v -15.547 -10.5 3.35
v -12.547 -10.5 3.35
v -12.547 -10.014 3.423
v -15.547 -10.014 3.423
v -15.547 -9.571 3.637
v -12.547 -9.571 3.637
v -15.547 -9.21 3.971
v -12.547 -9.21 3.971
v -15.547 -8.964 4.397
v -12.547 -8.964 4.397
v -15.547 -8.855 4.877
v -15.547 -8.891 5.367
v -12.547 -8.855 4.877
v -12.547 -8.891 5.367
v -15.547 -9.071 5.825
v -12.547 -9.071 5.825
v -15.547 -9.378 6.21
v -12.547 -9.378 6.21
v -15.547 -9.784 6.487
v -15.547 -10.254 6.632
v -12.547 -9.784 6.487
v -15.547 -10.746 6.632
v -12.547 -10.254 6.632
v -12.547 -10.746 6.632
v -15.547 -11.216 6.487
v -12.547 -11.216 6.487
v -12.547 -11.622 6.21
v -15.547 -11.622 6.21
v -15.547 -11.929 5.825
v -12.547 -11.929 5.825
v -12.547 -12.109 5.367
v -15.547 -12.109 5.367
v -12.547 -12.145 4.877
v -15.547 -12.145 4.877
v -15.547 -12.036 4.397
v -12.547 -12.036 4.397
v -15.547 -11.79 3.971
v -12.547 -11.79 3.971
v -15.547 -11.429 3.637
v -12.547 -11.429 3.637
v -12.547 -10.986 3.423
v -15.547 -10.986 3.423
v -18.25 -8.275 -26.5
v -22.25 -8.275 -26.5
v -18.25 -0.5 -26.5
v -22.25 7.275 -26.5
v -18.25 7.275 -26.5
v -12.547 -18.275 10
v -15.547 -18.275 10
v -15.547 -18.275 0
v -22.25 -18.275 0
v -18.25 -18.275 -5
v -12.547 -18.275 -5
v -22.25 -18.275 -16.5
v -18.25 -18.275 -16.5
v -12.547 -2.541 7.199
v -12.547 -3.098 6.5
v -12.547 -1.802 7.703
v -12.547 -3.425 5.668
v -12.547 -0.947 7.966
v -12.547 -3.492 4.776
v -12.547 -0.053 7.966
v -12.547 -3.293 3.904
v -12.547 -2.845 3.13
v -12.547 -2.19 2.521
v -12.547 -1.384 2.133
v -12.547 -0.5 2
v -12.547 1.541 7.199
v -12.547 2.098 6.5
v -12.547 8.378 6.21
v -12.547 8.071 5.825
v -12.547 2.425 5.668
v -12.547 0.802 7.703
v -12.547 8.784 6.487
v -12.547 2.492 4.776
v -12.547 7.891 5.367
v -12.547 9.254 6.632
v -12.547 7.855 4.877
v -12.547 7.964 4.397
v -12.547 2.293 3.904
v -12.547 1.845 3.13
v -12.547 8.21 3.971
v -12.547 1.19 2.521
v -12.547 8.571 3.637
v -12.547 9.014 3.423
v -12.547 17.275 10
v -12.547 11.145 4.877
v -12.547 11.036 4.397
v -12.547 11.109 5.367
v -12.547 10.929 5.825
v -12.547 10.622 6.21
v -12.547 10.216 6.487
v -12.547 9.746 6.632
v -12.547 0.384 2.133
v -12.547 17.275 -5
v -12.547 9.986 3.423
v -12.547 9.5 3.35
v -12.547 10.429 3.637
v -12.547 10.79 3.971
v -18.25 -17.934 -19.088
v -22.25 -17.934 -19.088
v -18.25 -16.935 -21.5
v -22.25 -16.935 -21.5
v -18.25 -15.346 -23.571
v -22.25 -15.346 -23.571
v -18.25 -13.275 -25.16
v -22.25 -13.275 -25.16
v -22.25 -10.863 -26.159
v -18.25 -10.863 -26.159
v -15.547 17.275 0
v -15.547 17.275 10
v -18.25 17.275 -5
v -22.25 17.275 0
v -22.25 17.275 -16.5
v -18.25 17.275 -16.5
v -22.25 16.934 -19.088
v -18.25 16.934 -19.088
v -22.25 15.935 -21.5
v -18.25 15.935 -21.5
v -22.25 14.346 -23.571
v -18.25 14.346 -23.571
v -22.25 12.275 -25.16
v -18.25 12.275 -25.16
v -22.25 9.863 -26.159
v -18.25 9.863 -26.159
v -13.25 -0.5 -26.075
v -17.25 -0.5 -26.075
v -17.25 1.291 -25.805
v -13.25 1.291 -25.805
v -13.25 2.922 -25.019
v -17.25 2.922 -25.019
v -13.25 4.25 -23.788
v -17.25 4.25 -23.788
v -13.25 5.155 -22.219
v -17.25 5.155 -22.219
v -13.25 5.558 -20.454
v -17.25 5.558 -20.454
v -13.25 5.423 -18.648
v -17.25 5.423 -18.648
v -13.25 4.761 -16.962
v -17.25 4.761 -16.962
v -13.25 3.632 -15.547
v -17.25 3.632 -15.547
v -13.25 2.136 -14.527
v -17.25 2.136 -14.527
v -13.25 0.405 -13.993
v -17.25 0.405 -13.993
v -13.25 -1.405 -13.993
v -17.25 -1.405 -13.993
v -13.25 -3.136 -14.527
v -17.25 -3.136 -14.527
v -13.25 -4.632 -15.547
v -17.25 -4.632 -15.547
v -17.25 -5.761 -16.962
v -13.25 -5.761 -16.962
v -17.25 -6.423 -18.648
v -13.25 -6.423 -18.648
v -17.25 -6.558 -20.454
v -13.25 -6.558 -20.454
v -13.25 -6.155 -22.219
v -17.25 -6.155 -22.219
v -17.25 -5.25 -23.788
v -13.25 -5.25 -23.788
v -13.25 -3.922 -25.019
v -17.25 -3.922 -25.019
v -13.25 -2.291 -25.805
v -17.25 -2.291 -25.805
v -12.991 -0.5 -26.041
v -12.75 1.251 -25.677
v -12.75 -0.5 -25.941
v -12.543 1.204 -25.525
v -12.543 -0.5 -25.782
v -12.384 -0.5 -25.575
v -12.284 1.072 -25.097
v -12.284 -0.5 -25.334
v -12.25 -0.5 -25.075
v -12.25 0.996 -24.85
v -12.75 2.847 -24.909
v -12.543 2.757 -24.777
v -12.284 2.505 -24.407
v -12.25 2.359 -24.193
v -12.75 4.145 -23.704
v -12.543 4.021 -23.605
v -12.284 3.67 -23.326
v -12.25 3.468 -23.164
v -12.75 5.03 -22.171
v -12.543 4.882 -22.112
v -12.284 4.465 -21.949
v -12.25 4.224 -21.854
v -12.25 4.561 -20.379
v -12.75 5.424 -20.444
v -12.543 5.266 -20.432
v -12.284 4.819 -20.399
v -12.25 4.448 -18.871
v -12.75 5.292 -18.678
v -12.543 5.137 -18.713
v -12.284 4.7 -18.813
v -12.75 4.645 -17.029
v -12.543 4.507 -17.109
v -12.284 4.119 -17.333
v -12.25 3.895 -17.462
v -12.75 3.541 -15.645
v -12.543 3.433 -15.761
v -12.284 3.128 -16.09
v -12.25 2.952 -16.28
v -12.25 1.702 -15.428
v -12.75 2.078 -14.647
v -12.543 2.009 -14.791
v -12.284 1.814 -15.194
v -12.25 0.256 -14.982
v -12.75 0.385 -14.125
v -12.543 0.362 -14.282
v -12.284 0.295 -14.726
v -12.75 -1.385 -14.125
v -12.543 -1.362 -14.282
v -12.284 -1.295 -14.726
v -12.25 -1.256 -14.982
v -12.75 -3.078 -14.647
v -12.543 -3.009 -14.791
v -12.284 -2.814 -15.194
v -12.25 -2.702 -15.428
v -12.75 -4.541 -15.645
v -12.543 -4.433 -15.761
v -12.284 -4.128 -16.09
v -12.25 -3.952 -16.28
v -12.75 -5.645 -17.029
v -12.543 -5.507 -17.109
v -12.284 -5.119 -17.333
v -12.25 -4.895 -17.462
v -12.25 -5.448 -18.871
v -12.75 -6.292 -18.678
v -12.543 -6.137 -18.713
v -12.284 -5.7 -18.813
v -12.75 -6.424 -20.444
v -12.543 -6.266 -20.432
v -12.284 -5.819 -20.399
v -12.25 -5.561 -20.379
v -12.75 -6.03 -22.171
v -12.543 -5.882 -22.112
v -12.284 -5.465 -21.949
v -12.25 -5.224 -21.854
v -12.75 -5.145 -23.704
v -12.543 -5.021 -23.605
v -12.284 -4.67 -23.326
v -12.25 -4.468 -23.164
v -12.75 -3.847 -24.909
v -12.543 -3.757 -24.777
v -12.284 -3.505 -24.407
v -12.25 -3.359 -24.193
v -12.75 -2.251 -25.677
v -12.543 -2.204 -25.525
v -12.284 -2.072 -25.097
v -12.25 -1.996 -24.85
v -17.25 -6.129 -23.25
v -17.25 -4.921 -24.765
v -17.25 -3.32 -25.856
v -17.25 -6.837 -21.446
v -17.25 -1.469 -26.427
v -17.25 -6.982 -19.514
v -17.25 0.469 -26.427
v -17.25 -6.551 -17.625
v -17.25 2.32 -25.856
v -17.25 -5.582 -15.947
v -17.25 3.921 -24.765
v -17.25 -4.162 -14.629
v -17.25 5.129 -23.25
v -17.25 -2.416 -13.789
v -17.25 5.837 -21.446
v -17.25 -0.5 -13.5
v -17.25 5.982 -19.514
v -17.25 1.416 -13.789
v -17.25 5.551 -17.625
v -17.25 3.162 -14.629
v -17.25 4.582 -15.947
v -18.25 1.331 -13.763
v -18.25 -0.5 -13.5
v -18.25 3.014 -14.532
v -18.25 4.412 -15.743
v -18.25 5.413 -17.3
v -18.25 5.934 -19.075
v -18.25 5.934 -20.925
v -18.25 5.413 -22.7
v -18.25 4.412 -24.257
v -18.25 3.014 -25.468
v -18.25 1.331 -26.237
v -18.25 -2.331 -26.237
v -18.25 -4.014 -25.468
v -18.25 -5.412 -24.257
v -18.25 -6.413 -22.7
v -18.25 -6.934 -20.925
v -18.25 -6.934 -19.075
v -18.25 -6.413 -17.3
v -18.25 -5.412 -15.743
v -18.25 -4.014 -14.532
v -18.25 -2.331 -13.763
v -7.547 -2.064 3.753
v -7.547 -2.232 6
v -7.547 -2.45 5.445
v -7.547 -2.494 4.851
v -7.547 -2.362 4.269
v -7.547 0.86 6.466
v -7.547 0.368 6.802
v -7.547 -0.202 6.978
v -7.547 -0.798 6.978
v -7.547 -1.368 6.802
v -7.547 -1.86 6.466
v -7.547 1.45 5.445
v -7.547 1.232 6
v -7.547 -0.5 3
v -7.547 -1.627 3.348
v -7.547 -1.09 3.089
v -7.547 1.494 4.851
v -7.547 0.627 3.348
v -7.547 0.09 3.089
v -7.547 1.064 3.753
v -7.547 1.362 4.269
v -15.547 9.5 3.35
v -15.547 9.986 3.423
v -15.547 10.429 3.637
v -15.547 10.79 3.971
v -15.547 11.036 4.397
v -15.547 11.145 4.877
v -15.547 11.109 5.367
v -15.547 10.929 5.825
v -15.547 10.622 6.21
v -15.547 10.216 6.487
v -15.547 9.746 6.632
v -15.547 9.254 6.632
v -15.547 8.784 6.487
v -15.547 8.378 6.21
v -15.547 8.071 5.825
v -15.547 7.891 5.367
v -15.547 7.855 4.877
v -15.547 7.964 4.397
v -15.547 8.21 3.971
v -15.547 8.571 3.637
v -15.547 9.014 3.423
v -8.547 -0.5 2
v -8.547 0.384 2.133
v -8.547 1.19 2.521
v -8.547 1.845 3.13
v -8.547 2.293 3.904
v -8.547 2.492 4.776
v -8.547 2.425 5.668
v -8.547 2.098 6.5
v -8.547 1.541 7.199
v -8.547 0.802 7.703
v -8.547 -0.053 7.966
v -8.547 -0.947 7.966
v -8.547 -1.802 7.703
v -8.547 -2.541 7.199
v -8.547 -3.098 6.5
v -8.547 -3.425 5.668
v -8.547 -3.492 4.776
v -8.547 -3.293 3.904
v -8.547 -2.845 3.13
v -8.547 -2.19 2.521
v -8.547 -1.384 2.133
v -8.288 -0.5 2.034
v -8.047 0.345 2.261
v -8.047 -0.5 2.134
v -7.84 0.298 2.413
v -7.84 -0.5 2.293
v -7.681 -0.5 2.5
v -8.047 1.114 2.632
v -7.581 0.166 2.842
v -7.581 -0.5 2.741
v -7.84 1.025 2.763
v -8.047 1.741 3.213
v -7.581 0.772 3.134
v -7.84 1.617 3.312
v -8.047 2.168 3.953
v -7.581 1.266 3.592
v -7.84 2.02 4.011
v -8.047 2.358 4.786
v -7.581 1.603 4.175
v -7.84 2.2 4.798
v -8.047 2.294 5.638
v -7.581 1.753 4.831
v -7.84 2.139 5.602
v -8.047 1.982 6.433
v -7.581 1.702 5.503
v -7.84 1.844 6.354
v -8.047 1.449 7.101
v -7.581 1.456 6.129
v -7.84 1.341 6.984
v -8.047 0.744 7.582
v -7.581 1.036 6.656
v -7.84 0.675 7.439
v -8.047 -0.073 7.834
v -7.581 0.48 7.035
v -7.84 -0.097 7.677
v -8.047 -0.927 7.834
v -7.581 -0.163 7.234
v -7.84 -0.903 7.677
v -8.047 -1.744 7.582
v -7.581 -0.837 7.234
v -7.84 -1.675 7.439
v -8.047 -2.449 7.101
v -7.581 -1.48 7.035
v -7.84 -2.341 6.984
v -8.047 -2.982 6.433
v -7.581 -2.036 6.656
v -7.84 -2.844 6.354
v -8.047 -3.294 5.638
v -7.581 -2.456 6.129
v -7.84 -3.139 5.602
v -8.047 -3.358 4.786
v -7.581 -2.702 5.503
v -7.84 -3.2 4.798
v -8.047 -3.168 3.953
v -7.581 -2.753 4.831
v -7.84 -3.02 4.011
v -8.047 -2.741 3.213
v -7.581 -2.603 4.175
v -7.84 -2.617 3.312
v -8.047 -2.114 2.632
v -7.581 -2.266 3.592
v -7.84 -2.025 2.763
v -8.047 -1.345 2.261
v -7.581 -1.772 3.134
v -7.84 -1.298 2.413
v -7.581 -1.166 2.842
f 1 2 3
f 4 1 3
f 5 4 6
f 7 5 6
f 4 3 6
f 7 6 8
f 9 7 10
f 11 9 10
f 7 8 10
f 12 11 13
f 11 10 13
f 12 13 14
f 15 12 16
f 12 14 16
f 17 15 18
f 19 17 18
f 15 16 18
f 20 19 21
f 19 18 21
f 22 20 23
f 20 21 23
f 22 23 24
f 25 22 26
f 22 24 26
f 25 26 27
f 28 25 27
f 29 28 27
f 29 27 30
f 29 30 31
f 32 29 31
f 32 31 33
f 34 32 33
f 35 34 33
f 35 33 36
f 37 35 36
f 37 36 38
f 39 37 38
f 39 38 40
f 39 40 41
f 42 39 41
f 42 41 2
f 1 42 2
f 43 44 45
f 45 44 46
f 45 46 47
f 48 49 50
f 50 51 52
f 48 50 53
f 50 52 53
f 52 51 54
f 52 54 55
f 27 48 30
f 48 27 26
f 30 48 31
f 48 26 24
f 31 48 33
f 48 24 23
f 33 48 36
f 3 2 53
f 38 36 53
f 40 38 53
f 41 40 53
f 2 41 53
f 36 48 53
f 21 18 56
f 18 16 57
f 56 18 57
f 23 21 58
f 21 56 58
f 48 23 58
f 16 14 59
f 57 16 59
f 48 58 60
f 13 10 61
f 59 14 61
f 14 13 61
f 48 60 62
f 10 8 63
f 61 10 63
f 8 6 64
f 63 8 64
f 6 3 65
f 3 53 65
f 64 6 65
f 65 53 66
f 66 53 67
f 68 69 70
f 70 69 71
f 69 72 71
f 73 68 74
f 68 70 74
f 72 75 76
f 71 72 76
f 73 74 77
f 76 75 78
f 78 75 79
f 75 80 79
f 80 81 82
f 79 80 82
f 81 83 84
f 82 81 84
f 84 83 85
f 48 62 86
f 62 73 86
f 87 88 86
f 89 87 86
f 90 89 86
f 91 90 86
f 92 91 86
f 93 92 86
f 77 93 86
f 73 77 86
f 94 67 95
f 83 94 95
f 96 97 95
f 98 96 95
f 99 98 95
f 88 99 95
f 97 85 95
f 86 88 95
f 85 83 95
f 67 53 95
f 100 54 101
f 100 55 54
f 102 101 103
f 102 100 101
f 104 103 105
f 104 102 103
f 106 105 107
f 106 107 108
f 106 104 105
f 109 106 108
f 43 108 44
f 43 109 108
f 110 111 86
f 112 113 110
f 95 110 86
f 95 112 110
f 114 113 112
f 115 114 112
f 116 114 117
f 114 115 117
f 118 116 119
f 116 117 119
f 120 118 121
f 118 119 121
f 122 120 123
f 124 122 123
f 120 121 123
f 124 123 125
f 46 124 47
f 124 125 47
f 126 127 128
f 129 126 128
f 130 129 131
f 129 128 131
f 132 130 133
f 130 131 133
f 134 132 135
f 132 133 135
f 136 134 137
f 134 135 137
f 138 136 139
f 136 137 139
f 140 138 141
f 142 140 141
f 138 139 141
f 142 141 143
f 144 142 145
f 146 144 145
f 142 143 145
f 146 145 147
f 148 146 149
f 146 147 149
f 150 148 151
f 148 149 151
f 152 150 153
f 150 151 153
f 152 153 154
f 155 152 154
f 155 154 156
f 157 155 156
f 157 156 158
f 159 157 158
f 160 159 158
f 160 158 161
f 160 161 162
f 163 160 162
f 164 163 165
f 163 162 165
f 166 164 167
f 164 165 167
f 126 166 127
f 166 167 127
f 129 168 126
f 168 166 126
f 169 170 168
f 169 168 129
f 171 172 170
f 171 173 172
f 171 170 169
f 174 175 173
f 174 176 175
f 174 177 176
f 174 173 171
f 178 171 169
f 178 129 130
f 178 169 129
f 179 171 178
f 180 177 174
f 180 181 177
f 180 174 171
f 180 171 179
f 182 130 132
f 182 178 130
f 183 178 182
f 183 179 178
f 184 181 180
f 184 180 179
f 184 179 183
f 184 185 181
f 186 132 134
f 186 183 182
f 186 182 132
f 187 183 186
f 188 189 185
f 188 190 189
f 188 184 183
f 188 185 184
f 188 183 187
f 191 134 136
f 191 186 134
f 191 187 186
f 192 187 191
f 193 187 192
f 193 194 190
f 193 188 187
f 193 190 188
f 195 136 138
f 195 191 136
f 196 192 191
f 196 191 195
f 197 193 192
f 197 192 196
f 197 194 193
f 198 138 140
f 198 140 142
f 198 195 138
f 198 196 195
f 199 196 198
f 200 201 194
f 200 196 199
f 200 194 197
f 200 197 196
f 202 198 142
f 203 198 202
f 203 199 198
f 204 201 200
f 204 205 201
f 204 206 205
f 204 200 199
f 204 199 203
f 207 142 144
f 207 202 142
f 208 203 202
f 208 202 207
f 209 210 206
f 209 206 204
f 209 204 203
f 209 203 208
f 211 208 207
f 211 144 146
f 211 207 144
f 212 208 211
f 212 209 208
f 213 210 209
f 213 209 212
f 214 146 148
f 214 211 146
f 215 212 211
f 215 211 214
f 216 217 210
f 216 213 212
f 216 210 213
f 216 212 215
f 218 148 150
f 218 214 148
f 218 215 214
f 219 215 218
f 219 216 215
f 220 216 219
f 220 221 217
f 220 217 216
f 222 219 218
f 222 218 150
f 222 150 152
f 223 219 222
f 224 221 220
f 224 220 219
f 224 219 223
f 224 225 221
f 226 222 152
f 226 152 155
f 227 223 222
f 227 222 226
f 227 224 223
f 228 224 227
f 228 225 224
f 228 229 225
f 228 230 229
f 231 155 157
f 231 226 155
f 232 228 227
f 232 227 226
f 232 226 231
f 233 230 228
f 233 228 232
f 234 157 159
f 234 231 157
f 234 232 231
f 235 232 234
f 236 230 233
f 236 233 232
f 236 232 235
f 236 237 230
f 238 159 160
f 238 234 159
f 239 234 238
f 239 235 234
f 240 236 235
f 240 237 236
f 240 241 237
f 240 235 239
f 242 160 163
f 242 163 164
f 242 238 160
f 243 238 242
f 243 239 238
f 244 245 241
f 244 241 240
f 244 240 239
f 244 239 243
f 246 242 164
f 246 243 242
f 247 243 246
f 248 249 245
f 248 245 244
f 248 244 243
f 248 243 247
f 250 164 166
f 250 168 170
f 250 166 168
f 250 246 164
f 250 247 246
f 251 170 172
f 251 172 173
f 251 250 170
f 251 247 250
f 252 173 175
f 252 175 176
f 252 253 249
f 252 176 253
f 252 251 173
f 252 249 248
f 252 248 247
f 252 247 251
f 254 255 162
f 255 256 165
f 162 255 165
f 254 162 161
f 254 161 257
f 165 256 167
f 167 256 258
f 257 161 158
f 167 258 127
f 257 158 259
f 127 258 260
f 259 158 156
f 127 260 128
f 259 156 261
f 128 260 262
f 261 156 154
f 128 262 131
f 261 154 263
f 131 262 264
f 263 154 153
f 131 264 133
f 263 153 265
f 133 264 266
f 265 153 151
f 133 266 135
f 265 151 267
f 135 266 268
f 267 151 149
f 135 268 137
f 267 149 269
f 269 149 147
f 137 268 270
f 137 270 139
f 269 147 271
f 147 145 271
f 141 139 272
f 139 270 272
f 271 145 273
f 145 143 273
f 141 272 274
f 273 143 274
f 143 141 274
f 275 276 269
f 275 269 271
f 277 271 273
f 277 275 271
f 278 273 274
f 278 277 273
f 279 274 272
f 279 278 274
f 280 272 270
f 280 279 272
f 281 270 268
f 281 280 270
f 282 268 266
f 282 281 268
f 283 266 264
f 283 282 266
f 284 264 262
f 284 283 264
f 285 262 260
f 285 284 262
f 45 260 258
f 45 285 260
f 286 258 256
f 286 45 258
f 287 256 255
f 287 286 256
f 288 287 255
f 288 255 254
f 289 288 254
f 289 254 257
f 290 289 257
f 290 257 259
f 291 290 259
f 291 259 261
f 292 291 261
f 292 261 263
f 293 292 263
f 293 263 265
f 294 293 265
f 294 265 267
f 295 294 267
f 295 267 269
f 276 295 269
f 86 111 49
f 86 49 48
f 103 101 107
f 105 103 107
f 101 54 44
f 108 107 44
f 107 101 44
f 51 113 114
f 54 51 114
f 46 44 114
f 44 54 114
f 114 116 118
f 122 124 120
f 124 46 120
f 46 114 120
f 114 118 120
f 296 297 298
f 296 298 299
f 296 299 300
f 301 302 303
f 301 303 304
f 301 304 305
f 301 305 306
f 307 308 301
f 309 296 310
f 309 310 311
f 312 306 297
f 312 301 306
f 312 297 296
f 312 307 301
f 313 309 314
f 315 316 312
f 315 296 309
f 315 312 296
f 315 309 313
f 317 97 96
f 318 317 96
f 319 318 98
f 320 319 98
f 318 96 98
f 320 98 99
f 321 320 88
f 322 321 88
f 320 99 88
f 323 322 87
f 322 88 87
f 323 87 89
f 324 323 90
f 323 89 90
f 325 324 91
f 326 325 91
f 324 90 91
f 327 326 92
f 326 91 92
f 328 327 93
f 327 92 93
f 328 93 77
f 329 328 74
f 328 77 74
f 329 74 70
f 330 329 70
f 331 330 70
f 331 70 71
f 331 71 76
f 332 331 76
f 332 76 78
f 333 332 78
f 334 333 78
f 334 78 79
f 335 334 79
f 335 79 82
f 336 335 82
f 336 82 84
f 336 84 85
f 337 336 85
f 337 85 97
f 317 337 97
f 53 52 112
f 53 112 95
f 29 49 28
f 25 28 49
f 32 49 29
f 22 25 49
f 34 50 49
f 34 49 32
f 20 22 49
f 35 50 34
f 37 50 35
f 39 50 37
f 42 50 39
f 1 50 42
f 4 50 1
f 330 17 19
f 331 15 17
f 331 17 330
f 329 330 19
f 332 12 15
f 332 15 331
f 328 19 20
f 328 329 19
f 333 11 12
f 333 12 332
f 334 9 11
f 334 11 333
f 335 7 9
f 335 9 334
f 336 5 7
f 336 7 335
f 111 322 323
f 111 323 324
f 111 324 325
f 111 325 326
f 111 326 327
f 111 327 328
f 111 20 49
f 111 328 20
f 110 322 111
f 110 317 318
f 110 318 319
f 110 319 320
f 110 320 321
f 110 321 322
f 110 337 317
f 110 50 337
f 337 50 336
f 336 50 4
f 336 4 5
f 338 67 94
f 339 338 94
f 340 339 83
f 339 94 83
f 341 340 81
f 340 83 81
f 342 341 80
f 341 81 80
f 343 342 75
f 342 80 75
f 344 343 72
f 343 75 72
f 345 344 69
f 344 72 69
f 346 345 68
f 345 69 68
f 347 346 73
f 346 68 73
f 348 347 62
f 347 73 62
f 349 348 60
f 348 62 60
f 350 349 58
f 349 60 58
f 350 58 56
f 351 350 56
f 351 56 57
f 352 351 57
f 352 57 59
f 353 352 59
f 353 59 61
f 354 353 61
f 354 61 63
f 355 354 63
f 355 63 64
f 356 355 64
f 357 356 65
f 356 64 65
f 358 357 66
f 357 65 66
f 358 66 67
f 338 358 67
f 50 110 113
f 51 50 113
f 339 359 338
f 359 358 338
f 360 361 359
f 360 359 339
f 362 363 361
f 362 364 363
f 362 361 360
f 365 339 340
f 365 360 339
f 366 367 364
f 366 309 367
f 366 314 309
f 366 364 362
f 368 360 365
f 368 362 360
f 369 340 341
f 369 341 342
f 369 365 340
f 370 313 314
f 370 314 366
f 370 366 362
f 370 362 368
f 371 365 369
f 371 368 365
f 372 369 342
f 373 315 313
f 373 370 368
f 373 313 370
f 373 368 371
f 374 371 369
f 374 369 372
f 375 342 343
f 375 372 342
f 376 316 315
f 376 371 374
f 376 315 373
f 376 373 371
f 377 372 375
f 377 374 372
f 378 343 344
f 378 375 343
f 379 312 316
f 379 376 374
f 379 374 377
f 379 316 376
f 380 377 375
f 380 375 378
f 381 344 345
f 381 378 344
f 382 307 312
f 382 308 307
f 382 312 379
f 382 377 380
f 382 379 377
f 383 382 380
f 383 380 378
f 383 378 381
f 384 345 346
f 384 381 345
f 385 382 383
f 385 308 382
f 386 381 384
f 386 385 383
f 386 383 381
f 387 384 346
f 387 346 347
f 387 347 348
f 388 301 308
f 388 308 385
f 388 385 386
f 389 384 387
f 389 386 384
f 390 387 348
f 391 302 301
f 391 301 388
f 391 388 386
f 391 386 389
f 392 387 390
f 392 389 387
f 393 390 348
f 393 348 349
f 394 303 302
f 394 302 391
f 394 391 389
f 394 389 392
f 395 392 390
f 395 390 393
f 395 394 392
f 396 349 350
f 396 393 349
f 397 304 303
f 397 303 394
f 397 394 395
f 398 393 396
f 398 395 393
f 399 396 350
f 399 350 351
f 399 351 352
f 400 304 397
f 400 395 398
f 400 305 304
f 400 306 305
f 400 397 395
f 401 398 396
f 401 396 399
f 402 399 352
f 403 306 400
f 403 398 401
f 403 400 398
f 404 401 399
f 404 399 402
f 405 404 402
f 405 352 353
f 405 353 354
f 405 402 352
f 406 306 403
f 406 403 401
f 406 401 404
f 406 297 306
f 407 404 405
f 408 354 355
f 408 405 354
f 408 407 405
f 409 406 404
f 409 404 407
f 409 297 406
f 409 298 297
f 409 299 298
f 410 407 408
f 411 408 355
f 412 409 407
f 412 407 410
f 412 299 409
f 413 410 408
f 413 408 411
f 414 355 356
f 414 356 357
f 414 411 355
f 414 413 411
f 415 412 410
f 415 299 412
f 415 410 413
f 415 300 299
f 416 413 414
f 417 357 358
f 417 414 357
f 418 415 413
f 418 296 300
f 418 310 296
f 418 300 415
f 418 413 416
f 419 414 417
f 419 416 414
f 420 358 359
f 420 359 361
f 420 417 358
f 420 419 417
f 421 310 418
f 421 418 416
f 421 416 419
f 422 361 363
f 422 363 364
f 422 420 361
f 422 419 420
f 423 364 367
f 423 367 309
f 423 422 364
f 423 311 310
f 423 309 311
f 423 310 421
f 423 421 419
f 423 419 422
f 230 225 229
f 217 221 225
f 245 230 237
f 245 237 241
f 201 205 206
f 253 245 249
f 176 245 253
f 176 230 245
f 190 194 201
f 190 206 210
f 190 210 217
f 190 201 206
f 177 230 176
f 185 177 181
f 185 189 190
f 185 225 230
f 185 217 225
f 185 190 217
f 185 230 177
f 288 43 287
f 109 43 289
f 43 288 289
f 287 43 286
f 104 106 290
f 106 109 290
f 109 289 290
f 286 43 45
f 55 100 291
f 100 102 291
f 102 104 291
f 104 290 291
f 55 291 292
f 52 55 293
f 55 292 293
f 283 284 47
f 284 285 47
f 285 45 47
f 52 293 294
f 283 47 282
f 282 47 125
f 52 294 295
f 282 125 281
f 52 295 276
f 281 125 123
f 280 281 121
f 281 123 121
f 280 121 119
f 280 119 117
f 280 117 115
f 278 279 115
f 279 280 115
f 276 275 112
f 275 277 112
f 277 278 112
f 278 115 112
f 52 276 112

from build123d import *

# Parameters (mm, degrees)
SKETCH4_W                = 12.46
SKETCH4_H                = 17.25
BOSS_EXTRUDE3_DEPTH      = 6
SKETCH8_R                = 12.546781182
SKETCH8_R_2              = 11.15
BOSS_EXTRUDE6_DEPTH      = 8.3
BOSS_EXTRUDE6_DEPTH_BACK = 17.25
BOSS_EXTRUDE4_DEPTH      = 17.25
SKETCH6_R                = 0.75
CUT_EXTRUDE1_DEPTH       = 5
CHAMFER1_SIZE            = 0.5
CHAMFER1_SIZE2           = 0.866025404
SKETCH10_W               = 12.46
SKETCH10_H               = 23.7
CUT_EXTRUDE3_DEPTH       = 17.25
BOSS_EXTRUDE7_DEPTH      = 8.3
BOSS_EXTRUDE9_DEPTH      = 10
SKETCH20_R               = 11.15
SKETCH20_R_2             = 7.15
BOSS_EXTRUDE11_DEPTH     = 8.3
SKETCH21_R               = 10.15
SKETCH21_R_2             = 7.15
CUT_EXTRUDE7_DEPTH       = 1.3
SKETCH11_W               = 10
SKETCH11_H               = 2
CUT_EXTRUDE4_DEPTH       = 23.7
CUT_EXTRUDE8_REACH       = 37.55
SKETCH25_W               = 12.46
SKETCH25_H               = 6
BOSS_EXTRUDE10_DEPTH     = 35.55
SKETCH18_W               = 21.5
SKETCH18_H               = 11.438292938
CUT_EXTRUDE5_DEPTH       = 2
SKETCH19_R               = 3.5
CUT_EXTRUDE6_DEPTH       = 43.5
CUT_EXTRUDE6_DEPTH_BACK  = 3
FILLET1_R                = 10
SKETCH22_R               = 6.5
BOSS_EXTRUDE12_DEPTH     = 5
SKETCH23_R               = 6.075
BOSS_EXTRUDE13_DEPTH     = 5
FILLET2_R                = 1
BOSS_EXTRUDE14_DEPTH     = 2
CUT_EXTRUDE9_REACH       = 46.5
SKETCH27_R               = 0.75
CUT_EXTRUDE10_DEPTH      = 36.55
SKETCH29_W               = 3
SKETCH29_H               = 35.55
BOSS_EXTRUDE15_DEPTH     = 10
SKETCH30_R               = 3
BOSS_EXTRUDE16_DEPTH     = 5
FILLET3_R                = 1
SKETCH31_R               = 1.65
CUT_EXTRUDE11_DEPTH      = 23.25


with BuildPart() as part:
    # Sketch4 → Boss-Extrude3 (new body)
    with BuildSketch(Plane.XY):
        with Locations((0, -1.35)):
            Rectangle(SKETCH4_W, SKETCH4_H)
    extrude(amount=BOSS_EXTRUDE3_DEPTH)



with BuildPart() as body_2:
    # Sketch8 → Boss-Extrude6 (new body, two sides)
    with BuildSketch(Plane(origin=(0, -9.975, 0), x_dir=(-1, 0, 0), z_dir=(0, -1, 0))) as boss_extrude6_sk:
        with Locations((0, -23.55)):
            Circle(SKETCH8_R)
        with Locations((0, -23.55)):
            Circle(SKETCH8_R_2, mode=Mode.SUBTRACT)
    extrude(amount=BOSS_EXTRUDE6_DEPTH)
    extrude(boss_extrude6_sk.sketch, amount=-BOSS_EXTRUDE6_DEPTH_BACK)


with BuildPart() as part_1:
    add(part.part)

    add(body_2.part)  # Boss-Extrude4 merges body 2
    # Sketch5 → Boss-Extrude4 (add)
    with BuildSketch(Plane(origin=(0, 7.275, 0), x_dir=(1, 0, 0), z_dir=(0, 1, 0))):
        with BuildLine():
            Line((12.546781182, -23.55), (12.546781182, 0))
            Line((12.546781182, 0), (6.23, 0))
            Line((6.23, 0), (6.23, -29.7))
            Line((6.23, -29.7), (-6.23, -29.7))
            Line((-6.23, -29.7), (-6.23, 0))
            Line((-6.23, 0), (-12.546781182, 0))
            Line((-12.546781182, 0), (-12.546781182, -23.55))
            ThreePointArc((-12.546781182, -23.55), (0, -36.096781182), (12.546781182, -23.55))
        make_face()
    extrude(amount=-BOSS_EXTRUDE4_DEPTH)

    # Sketch6 → Cut-Extrude1 (cut)
    with BuildSketch(Plane(origin=(0, 7.275, 0), x_dir=(1, 0, 0), z_dir=(0, 1, 0))):
        with Locations((0, -3.6)):
            Circle(SKETCH6_R)
        with Locations((0, -32.1)):
            Circle(SKETCH6_R)
    extrude(amount=-CUT_EXTRUDE1_DEPTH, mode=Mode.SUBTRACT)

    # Chamfer1
    chamfer1_edges = [part_1.edges().sort_by_distance(p)[0] for p in [
        (-0.75, 7.275, 3.6),
        (-0.75, 7.275, 32.1),
    ]]
    chamfer1_side = [part_1.faces().sort_by_distance(p)[0] for p in [
        (0, 7.275, 35.657160381),
    ]]
    chamfer(chamfer1_edges, length=CHAMFER1_SIZE, length2=CHAMFER1_SIZE2, reference=chamfer1_side[0])

    # Sketch10 → Cut-Extrude3 (cut)
    with BuildSketch(Plane(origin=(0, 7.275, 0), x_dir=(1, 0, 0), z_dir=(0, 1, 0))):
        with Locations((0, -17.85)):
            Rectangle(SKETCH10_W, SKETCH10_H)
    extrude(amount=-CUT_EXTRUDE3_DEPTH, mode=Mode.SUBTRACT)

    # Sketch13 → Boss-Extrude7 (add)
    with BuildSketch(Plane.XZ.offset(18.275)):
        with BuildLine():
            Line((-12.546781182, 23.55), (-12.546781182, 0))
            Line((-12.546781182, 0), (12.546781182, 0))
            Line((12.546781182, 0), (12.546781182, 23.55))
            ThreePointArc((12.546781182, 23.55), (0, 11.003218818), (-12.546781182, 23.55))
        make_face()
    extrude(amount=-BOSS_EXTRUDE7_DEPTH)

    # Sketch15 → Boss-Extrude9 (add)
    with BuildSketch(Plane(origin=(0, 7.275, 0), x_dir=(1, 0, 0), z_dir=(0, 1, 0))):
        with BuildLine():
            Line((-12.546781182, 0), (12.546781182, 0))
            Line((12.546781182, 0), (12.546781182, -23.55))
            ThreePointArc((12.546781182, -23.55), (0, -36.096781182), (-12.546781182, -23.55))
            Line((-12.546781182, -23.55), (-12.546781182, 0))
        make_face()
        with BuildLine():
            Line((-6.23, -0.8), (6.23, -0.8))
            Line((6.23, -0.8), (6.23, -33))
            ThreePointArc((6.23, -33), (5.790660172, -34.060660172), (4.73, -34.5))
            Line((4.73, -34.5), (-4.73, -34.5))
            ThreePointArc((-4.73, -34.5), (-5.790660172, -34.060660172), (-6.23, -33))
            Line((-6.23, -33), (-6.23, -0.8))
        make_face(mode=Mode.SUBTRACT)
    extrude(amount=BOSS_EXTRUDE9_DEPTH)

    # Sketch20 → Boss-Extrude11 (add)
    with BuildSketch(Plane.XZ.offset(18.275)):
        with Locations((0, 23.55)):
            Circle(SKETCH20_R)
        with Locations((0, 23.55)):
            Circle(SKETCH20_R_2, mode=Mode.SUBTRACT)
    extrude(amount=-BOSS_EXTRUDE11_DEPTH)

    # Sketch21 → Cut-Extrude7 (cut)
    with BuildSketch(Plane.XZ.offset(18.275)):
        with Locations((0, 23.55)):
            Circle(SKETCH21_R)
        with Locations((0, 23.55)):
            Circle(SKETCH21_R_2, mode=Mode.SUBTRACT)
    extrude(amount=-CUT_EXTRUDE7_DEPTH, mode=Mode.SUBTRACT)

    # Sketch11 → Cut-Extrude4 (cut)
    with BuildSketch(Plane.XY.offset(29.7)):
        with Locations((0, -10.975)):
            Rectangle(SKETCH11_W, SKETCH11_H)
    extrude(amount=-CUT_EXTRUDE4_DEPTH, mode=Mode.SUBTRACT)

    # Sketch25 → Cut-Extrude8 (cut, up to next)
    with BuildSketch(Plane.XZ.offset(18.275), mode=Mode.PRIVATE) as cut_extrude8_sk1:
        with Locations((0, 9)):
            Rectangle(SKETCH25_W, SKETCH25_H)
    cut_extrude8_tool1 = extrude(cut_extrude8_sk1.sketch, amount=-CUT_EXTRUDE8_REACH, mode=Mode.PRIVATE) & part_1.part
    add(cut_extrude8_tool1.solids().sort_by_distance((0, -18.275, 9))[0], mode=Mode.SUBTRACT)

    # Sketch17 → Boss-Extrude10 (add)
    with BuildSketch(Plane(origin=(0, 17.275, 0), x_dir=(1, 0, 0), z_dir=(0, 1, 0))):
        Polygon((22.25, 26.5), (22.25, 0), (-22.25, 0), (-22.25, 26.5), (-18.25, 26.5), (-18.25, 5), (18.25, 5), (18.25, 26.5), align=None)
    extrude(amount=-BOSS_EXTRUDE10_DEPTH)

    # Sketch18 → Cut-Extrude5 (cut)
    with BuildSketch(Plane.ZY.offset(-18.25)):
        with Locations((-15.75, -0.5)):
            Rectangle(SKETCH18_W, SKETCH18_H)
    extrude(amount=-CUT_EXTRUDE5_DEPTH, mode=Mode.SUBTRACT)

    # Sketch19 → Cut-Extrude6 (cut, two sides)
    with BuildSketch(Plane.ZY.offset(-20.25)) as cut_extrude6_sk:
        with Locations((-20, -0.5)):
            Circle(SKETCH19_R)
    extrude(amount=CUT_EXTRUDE6_DEPTH, mode=Mode.SUBTRACT)
    extrude(cut_extrude6_sk.sketch, amount=-CUT_EXTRUDE6_DEPTH_BACK, mode=Mode.SUBTRACT)

    # Fillet1
    fillet1_edges = [part_1.edges().sort_by_distance(p)[0] for p in [
        (20.25, 17.275, -26.5),
        (-20.25, 17.275, -26.5),
        (-20.25, -18.275, -26.5),
        (20.25, -18.275, -26.5),
    ]]
    fillet(fillet1_edges, radius=FILLET1_R)

    # Sketch22 → Boss-Extrude12 (add)
    with BuildSketch(Plane.ZY.offset(22.25)):
        with Locations((-20, -0.5)):
            Circle(SKETCH22_R)
    extrude(amount=-BOSS_EXTRUDE12_DEPTH)

    # Sketch23 → Boss-Extrude13 (add)
    with BuildSketch(Plane(origin=(-17.25, 0, 0), x_dir=(0, 0, -1), z_dir=(1, 0, 0))):
        with Locations((20, -0.5)):
            Circle(SKETCH23_R)
    extrude(amount=BOSS_EXTRUDE13_DEPTH)

    # Fillet2
    fillet2_edges = [part_1.edges().sort_by_distance(p)[0] for p in [
        (-12.25, -0.5, -13.925),
    ]]
    fillet(fillet2_edges, radius=FILLET2_R)

    # Sketch26 → Boss-Extrude14 (add)
    with BuildSketch(Plane.ZY.offset(-20.25)):
        Polygon((-5, 2), (-20, 2.6585), (-26.5, 2.94385), (-26.5, 5.219146469), (-5, 5.219146469), align=None)
        Polygon((-20, -3.6585), (-5, -3), (-5, -6.219146469), (-26.5, -6.219146469), (-26.5, -3.94385), align=None)
    extrude(amount=BOSS_EXTRUDE14_DEPTH)

    # Sketch27 → Cut-Extrude9 (cut, up to next)
    with BuildSketch(Plane(origin=(22.25, 0, 0), x_dir=(0, 0, -1), z_dir=(1, 0, 0)), mode=Mode.PRIVATE) as cut_extrude9_sk1:
        with Locations((10, -0.5)):
            Circle(SKETCH27_R)
    cut_extrude9_tool1 = extrude(cut_extrude9_sk1.sketch, amount=-CUT_EXTRUDE9_REACH, mode=Mode.PRIVATE) & part_1.part
    add(cut_extrude9_tool1.solids().sort_by_distance((22.25, -0.5, -10))[0], mode=Mode.SUBTRACT)

    # Sketch28 → Cut-Extrude10 (cut, through all)
    with BuildSketch(Plane(origin=(0, 17.275, 0), x_dir=(1, 0, 0), z_dir=(0, 1, 0))):
        Polygon((-12.546781182, 11.805014222), (-12.546781182, -42.756283402), (39.689088419, -42.756283402), (38.70358058, 30.977621269), (-8.600795685, 28.379464239), align=None)
    extrude(amount=-CUT_EXTRUDE10_DEPTH, mode=Mode.SUBTRACT)

    # Sketch29 → Boss-Extrude15 (add)
    with BuildSketch(Plane.XY):
        with Locations((-14.046781182, -0.5)):
            Rectangle(SKETCH29_W, SKETCH29_H)
    extrude(amount=BOSS_EXTRUDE15_DEPTH)

    # Sketch30 → Boss-Extrude16 (add)
    with BuildSketch(Plane(origin=(-12.546781182, 0, 0), x_dir=(0, 0, -1), z_dir=(1, 0, 0))):
        with Locations((-5, -0.5)):
            Circle(SKETCH30_R)
    extrude(amount=BOSS_EXTRUDE16_DEPTH)

    # Fillet3
    fillet3_edges = [part_1.edges().sort_by_distance(p)[0] for p in [
        (-7.546781182, -0.5, 8),
    ]]
    fillet(fillet3_edges, radius=FILLET3_R)

    # Sketch31 → Cut-Extrude11 (cut, through all)
    with BuildSketch(Plane(origin=(0, 0, 0), x_dir=(0, 0, -1), z_dir=(1, 0, 0))):
        with Locations((-5, 9.5)):
            Circle(SKETCH31_R)
        with Locations((-5, -10.5)):
            Circle(SKETCH31_R)
    extrude(amount=-CUT_EXTRUDE11_DEPTH, mode=Mode.SUBTRACT)


solid = part_1.part
